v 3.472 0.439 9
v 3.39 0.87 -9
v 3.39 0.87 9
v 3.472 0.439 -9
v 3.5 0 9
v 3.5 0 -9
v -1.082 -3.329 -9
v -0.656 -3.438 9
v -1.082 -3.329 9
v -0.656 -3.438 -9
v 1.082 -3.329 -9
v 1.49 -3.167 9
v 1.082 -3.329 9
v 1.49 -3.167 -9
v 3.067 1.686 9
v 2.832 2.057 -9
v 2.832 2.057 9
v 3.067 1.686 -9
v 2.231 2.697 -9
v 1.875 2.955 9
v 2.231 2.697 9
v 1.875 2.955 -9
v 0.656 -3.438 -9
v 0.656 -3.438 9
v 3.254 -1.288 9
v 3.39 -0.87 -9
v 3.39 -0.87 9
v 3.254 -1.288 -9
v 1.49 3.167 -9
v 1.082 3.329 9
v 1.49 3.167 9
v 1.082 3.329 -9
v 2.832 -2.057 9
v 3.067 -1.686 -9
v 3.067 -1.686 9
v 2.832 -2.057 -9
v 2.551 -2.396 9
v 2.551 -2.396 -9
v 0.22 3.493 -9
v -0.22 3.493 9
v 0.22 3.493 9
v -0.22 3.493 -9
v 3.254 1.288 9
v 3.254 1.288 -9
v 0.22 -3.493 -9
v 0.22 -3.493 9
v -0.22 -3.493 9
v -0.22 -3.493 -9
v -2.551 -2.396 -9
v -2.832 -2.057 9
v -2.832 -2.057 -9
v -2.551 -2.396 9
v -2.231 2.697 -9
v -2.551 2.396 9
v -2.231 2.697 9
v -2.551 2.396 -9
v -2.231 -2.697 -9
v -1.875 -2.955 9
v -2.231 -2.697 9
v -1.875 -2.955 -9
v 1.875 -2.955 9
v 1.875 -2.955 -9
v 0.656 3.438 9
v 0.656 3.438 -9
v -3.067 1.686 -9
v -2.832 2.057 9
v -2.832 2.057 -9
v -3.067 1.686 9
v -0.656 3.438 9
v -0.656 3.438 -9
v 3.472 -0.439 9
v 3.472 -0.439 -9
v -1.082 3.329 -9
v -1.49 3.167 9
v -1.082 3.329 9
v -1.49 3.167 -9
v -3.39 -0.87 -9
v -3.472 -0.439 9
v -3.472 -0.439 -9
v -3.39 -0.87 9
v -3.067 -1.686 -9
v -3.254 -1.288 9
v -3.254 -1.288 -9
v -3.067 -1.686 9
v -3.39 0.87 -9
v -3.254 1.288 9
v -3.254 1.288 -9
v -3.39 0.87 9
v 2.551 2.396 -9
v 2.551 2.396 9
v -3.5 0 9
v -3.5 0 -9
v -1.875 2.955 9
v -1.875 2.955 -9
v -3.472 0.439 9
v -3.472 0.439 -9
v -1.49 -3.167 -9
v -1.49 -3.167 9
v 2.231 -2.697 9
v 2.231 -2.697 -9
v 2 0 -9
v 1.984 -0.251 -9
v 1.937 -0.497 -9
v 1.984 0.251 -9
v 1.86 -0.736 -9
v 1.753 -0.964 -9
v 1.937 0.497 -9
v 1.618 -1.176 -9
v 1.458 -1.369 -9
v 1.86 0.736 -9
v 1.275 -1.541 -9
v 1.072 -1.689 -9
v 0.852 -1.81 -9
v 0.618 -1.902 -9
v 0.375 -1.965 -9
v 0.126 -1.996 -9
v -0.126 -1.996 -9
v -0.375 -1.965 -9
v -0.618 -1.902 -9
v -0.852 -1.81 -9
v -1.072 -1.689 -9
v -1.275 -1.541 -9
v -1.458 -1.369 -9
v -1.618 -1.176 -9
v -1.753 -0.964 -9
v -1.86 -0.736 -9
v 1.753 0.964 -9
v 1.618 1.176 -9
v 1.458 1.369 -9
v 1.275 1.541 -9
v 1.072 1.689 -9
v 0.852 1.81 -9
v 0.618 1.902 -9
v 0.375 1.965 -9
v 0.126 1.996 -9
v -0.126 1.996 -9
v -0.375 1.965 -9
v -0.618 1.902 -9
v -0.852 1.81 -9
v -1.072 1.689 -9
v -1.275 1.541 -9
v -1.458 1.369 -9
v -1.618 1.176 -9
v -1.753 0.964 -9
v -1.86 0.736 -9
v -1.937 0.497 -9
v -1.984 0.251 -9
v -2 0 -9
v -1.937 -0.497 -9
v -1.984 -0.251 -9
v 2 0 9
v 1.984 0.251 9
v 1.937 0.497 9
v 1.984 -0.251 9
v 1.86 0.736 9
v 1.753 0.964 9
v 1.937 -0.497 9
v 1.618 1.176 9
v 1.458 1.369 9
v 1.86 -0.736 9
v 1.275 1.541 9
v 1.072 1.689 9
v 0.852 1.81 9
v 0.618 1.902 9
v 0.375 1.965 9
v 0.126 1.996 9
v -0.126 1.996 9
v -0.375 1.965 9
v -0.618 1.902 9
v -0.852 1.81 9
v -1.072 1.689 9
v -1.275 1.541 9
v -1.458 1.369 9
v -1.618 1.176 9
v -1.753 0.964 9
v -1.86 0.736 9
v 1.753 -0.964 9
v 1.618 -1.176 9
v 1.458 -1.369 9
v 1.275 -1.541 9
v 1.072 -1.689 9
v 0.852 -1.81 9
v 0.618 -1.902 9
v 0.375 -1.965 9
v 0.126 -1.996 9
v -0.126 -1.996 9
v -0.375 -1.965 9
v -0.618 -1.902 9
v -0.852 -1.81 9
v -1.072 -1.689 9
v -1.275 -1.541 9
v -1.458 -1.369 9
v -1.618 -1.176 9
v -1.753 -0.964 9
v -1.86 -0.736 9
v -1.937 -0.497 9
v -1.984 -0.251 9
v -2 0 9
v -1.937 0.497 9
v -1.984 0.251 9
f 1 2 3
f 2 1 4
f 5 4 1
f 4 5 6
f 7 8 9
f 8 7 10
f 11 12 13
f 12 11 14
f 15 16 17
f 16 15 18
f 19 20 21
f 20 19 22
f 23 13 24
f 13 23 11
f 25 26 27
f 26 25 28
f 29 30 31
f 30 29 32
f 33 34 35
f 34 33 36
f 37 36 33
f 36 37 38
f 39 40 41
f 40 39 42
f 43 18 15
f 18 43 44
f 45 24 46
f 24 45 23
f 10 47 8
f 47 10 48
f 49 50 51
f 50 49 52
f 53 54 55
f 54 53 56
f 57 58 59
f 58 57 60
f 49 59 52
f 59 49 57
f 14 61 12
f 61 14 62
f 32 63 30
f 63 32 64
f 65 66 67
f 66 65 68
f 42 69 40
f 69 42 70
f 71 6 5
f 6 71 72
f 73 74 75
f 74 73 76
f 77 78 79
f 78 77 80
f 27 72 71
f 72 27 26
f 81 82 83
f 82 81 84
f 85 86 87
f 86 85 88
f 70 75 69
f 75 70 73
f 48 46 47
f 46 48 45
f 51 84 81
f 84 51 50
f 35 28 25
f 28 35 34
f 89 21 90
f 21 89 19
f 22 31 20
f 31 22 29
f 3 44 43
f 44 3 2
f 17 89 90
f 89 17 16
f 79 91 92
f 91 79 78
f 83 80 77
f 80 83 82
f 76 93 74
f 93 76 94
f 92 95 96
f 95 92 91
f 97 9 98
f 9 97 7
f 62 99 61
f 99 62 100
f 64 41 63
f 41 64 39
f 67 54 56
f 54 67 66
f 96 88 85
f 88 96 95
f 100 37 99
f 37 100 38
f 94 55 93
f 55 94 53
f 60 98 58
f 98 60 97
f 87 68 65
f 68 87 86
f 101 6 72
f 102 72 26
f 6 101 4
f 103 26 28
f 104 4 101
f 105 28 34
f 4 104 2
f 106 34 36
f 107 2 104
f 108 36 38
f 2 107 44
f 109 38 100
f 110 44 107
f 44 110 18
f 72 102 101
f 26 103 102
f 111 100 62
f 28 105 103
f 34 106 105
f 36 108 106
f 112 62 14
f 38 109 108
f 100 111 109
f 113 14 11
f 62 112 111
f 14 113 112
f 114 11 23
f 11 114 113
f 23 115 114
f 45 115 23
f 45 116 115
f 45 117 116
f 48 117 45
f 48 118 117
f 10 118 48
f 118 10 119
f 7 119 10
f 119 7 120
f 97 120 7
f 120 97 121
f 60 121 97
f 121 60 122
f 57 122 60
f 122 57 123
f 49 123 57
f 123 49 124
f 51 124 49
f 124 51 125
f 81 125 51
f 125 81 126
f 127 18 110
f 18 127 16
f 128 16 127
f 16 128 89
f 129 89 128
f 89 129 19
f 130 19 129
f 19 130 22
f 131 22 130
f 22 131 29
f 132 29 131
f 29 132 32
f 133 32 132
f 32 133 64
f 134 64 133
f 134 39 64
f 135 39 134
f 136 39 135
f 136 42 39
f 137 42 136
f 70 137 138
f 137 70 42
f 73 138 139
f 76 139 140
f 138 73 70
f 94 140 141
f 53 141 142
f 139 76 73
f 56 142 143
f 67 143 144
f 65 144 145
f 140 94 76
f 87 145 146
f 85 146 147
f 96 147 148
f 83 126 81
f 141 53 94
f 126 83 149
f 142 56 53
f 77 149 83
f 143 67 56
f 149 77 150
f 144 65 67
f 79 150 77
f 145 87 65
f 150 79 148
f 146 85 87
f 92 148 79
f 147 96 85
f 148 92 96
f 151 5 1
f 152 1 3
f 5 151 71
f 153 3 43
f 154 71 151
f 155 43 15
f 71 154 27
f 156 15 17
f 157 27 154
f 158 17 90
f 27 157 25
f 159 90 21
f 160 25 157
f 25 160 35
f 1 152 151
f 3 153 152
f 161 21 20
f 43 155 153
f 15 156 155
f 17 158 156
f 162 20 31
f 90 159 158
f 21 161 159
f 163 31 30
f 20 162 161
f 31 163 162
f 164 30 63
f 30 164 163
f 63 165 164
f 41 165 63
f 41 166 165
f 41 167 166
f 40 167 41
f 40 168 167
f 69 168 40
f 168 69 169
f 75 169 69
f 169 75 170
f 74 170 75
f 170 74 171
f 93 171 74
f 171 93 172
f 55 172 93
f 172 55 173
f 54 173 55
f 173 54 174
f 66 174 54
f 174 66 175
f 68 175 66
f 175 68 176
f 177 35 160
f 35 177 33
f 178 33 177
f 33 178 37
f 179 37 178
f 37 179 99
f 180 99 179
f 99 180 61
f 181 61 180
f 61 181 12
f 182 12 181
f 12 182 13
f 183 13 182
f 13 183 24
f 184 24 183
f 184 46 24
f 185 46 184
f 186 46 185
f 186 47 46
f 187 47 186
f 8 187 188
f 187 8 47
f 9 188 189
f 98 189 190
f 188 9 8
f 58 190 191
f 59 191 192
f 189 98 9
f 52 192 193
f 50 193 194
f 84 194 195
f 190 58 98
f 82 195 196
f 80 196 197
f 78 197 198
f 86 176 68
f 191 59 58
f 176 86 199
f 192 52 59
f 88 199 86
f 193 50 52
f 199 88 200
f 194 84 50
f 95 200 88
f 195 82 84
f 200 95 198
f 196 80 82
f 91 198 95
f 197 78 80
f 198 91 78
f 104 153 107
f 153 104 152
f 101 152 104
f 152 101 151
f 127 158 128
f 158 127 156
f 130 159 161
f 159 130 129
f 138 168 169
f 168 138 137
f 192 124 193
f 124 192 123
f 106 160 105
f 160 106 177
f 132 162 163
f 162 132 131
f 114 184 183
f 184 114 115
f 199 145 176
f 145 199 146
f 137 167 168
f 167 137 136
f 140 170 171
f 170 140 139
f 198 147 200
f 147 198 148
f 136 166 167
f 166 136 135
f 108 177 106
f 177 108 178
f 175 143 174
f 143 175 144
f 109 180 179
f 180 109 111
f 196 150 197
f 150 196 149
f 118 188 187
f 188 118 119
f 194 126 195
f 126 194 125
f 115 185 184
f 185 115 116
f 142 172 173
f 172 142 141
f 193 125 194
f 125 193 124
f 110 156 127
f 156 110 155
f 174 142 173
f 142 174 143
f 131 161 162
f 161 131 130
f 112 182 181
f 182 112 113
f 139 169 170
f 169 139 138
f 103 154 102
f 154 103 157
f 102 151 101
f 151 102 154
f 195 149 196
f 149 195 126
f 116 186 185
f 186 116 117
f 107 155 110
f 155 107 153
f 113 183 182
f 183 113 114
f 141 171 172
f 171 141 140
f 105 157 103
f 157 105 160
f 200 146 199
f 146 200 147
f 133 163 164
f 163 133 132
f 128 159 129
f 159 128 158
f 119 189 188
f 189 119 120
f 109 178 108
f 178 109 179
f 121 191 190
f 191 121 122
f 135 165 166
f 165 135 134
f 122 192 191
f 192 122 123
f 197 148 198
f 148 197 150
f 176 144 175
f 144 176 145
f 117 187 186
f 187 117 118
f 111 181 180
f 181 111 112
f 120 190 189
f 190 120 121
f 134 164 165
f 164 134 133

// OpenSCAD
$fn = 50;


difference() {
	union() {
		translate(v = [0, 0, -9.0000000000]) {
			cylinder(h = 18, r = 3.5000000000);
		}
	}
	union() {
		translate(v = [0, 0, -100.0000000000]) {
			cylinder(h = 200, r = 2.0000000000);
		}
	}
}
